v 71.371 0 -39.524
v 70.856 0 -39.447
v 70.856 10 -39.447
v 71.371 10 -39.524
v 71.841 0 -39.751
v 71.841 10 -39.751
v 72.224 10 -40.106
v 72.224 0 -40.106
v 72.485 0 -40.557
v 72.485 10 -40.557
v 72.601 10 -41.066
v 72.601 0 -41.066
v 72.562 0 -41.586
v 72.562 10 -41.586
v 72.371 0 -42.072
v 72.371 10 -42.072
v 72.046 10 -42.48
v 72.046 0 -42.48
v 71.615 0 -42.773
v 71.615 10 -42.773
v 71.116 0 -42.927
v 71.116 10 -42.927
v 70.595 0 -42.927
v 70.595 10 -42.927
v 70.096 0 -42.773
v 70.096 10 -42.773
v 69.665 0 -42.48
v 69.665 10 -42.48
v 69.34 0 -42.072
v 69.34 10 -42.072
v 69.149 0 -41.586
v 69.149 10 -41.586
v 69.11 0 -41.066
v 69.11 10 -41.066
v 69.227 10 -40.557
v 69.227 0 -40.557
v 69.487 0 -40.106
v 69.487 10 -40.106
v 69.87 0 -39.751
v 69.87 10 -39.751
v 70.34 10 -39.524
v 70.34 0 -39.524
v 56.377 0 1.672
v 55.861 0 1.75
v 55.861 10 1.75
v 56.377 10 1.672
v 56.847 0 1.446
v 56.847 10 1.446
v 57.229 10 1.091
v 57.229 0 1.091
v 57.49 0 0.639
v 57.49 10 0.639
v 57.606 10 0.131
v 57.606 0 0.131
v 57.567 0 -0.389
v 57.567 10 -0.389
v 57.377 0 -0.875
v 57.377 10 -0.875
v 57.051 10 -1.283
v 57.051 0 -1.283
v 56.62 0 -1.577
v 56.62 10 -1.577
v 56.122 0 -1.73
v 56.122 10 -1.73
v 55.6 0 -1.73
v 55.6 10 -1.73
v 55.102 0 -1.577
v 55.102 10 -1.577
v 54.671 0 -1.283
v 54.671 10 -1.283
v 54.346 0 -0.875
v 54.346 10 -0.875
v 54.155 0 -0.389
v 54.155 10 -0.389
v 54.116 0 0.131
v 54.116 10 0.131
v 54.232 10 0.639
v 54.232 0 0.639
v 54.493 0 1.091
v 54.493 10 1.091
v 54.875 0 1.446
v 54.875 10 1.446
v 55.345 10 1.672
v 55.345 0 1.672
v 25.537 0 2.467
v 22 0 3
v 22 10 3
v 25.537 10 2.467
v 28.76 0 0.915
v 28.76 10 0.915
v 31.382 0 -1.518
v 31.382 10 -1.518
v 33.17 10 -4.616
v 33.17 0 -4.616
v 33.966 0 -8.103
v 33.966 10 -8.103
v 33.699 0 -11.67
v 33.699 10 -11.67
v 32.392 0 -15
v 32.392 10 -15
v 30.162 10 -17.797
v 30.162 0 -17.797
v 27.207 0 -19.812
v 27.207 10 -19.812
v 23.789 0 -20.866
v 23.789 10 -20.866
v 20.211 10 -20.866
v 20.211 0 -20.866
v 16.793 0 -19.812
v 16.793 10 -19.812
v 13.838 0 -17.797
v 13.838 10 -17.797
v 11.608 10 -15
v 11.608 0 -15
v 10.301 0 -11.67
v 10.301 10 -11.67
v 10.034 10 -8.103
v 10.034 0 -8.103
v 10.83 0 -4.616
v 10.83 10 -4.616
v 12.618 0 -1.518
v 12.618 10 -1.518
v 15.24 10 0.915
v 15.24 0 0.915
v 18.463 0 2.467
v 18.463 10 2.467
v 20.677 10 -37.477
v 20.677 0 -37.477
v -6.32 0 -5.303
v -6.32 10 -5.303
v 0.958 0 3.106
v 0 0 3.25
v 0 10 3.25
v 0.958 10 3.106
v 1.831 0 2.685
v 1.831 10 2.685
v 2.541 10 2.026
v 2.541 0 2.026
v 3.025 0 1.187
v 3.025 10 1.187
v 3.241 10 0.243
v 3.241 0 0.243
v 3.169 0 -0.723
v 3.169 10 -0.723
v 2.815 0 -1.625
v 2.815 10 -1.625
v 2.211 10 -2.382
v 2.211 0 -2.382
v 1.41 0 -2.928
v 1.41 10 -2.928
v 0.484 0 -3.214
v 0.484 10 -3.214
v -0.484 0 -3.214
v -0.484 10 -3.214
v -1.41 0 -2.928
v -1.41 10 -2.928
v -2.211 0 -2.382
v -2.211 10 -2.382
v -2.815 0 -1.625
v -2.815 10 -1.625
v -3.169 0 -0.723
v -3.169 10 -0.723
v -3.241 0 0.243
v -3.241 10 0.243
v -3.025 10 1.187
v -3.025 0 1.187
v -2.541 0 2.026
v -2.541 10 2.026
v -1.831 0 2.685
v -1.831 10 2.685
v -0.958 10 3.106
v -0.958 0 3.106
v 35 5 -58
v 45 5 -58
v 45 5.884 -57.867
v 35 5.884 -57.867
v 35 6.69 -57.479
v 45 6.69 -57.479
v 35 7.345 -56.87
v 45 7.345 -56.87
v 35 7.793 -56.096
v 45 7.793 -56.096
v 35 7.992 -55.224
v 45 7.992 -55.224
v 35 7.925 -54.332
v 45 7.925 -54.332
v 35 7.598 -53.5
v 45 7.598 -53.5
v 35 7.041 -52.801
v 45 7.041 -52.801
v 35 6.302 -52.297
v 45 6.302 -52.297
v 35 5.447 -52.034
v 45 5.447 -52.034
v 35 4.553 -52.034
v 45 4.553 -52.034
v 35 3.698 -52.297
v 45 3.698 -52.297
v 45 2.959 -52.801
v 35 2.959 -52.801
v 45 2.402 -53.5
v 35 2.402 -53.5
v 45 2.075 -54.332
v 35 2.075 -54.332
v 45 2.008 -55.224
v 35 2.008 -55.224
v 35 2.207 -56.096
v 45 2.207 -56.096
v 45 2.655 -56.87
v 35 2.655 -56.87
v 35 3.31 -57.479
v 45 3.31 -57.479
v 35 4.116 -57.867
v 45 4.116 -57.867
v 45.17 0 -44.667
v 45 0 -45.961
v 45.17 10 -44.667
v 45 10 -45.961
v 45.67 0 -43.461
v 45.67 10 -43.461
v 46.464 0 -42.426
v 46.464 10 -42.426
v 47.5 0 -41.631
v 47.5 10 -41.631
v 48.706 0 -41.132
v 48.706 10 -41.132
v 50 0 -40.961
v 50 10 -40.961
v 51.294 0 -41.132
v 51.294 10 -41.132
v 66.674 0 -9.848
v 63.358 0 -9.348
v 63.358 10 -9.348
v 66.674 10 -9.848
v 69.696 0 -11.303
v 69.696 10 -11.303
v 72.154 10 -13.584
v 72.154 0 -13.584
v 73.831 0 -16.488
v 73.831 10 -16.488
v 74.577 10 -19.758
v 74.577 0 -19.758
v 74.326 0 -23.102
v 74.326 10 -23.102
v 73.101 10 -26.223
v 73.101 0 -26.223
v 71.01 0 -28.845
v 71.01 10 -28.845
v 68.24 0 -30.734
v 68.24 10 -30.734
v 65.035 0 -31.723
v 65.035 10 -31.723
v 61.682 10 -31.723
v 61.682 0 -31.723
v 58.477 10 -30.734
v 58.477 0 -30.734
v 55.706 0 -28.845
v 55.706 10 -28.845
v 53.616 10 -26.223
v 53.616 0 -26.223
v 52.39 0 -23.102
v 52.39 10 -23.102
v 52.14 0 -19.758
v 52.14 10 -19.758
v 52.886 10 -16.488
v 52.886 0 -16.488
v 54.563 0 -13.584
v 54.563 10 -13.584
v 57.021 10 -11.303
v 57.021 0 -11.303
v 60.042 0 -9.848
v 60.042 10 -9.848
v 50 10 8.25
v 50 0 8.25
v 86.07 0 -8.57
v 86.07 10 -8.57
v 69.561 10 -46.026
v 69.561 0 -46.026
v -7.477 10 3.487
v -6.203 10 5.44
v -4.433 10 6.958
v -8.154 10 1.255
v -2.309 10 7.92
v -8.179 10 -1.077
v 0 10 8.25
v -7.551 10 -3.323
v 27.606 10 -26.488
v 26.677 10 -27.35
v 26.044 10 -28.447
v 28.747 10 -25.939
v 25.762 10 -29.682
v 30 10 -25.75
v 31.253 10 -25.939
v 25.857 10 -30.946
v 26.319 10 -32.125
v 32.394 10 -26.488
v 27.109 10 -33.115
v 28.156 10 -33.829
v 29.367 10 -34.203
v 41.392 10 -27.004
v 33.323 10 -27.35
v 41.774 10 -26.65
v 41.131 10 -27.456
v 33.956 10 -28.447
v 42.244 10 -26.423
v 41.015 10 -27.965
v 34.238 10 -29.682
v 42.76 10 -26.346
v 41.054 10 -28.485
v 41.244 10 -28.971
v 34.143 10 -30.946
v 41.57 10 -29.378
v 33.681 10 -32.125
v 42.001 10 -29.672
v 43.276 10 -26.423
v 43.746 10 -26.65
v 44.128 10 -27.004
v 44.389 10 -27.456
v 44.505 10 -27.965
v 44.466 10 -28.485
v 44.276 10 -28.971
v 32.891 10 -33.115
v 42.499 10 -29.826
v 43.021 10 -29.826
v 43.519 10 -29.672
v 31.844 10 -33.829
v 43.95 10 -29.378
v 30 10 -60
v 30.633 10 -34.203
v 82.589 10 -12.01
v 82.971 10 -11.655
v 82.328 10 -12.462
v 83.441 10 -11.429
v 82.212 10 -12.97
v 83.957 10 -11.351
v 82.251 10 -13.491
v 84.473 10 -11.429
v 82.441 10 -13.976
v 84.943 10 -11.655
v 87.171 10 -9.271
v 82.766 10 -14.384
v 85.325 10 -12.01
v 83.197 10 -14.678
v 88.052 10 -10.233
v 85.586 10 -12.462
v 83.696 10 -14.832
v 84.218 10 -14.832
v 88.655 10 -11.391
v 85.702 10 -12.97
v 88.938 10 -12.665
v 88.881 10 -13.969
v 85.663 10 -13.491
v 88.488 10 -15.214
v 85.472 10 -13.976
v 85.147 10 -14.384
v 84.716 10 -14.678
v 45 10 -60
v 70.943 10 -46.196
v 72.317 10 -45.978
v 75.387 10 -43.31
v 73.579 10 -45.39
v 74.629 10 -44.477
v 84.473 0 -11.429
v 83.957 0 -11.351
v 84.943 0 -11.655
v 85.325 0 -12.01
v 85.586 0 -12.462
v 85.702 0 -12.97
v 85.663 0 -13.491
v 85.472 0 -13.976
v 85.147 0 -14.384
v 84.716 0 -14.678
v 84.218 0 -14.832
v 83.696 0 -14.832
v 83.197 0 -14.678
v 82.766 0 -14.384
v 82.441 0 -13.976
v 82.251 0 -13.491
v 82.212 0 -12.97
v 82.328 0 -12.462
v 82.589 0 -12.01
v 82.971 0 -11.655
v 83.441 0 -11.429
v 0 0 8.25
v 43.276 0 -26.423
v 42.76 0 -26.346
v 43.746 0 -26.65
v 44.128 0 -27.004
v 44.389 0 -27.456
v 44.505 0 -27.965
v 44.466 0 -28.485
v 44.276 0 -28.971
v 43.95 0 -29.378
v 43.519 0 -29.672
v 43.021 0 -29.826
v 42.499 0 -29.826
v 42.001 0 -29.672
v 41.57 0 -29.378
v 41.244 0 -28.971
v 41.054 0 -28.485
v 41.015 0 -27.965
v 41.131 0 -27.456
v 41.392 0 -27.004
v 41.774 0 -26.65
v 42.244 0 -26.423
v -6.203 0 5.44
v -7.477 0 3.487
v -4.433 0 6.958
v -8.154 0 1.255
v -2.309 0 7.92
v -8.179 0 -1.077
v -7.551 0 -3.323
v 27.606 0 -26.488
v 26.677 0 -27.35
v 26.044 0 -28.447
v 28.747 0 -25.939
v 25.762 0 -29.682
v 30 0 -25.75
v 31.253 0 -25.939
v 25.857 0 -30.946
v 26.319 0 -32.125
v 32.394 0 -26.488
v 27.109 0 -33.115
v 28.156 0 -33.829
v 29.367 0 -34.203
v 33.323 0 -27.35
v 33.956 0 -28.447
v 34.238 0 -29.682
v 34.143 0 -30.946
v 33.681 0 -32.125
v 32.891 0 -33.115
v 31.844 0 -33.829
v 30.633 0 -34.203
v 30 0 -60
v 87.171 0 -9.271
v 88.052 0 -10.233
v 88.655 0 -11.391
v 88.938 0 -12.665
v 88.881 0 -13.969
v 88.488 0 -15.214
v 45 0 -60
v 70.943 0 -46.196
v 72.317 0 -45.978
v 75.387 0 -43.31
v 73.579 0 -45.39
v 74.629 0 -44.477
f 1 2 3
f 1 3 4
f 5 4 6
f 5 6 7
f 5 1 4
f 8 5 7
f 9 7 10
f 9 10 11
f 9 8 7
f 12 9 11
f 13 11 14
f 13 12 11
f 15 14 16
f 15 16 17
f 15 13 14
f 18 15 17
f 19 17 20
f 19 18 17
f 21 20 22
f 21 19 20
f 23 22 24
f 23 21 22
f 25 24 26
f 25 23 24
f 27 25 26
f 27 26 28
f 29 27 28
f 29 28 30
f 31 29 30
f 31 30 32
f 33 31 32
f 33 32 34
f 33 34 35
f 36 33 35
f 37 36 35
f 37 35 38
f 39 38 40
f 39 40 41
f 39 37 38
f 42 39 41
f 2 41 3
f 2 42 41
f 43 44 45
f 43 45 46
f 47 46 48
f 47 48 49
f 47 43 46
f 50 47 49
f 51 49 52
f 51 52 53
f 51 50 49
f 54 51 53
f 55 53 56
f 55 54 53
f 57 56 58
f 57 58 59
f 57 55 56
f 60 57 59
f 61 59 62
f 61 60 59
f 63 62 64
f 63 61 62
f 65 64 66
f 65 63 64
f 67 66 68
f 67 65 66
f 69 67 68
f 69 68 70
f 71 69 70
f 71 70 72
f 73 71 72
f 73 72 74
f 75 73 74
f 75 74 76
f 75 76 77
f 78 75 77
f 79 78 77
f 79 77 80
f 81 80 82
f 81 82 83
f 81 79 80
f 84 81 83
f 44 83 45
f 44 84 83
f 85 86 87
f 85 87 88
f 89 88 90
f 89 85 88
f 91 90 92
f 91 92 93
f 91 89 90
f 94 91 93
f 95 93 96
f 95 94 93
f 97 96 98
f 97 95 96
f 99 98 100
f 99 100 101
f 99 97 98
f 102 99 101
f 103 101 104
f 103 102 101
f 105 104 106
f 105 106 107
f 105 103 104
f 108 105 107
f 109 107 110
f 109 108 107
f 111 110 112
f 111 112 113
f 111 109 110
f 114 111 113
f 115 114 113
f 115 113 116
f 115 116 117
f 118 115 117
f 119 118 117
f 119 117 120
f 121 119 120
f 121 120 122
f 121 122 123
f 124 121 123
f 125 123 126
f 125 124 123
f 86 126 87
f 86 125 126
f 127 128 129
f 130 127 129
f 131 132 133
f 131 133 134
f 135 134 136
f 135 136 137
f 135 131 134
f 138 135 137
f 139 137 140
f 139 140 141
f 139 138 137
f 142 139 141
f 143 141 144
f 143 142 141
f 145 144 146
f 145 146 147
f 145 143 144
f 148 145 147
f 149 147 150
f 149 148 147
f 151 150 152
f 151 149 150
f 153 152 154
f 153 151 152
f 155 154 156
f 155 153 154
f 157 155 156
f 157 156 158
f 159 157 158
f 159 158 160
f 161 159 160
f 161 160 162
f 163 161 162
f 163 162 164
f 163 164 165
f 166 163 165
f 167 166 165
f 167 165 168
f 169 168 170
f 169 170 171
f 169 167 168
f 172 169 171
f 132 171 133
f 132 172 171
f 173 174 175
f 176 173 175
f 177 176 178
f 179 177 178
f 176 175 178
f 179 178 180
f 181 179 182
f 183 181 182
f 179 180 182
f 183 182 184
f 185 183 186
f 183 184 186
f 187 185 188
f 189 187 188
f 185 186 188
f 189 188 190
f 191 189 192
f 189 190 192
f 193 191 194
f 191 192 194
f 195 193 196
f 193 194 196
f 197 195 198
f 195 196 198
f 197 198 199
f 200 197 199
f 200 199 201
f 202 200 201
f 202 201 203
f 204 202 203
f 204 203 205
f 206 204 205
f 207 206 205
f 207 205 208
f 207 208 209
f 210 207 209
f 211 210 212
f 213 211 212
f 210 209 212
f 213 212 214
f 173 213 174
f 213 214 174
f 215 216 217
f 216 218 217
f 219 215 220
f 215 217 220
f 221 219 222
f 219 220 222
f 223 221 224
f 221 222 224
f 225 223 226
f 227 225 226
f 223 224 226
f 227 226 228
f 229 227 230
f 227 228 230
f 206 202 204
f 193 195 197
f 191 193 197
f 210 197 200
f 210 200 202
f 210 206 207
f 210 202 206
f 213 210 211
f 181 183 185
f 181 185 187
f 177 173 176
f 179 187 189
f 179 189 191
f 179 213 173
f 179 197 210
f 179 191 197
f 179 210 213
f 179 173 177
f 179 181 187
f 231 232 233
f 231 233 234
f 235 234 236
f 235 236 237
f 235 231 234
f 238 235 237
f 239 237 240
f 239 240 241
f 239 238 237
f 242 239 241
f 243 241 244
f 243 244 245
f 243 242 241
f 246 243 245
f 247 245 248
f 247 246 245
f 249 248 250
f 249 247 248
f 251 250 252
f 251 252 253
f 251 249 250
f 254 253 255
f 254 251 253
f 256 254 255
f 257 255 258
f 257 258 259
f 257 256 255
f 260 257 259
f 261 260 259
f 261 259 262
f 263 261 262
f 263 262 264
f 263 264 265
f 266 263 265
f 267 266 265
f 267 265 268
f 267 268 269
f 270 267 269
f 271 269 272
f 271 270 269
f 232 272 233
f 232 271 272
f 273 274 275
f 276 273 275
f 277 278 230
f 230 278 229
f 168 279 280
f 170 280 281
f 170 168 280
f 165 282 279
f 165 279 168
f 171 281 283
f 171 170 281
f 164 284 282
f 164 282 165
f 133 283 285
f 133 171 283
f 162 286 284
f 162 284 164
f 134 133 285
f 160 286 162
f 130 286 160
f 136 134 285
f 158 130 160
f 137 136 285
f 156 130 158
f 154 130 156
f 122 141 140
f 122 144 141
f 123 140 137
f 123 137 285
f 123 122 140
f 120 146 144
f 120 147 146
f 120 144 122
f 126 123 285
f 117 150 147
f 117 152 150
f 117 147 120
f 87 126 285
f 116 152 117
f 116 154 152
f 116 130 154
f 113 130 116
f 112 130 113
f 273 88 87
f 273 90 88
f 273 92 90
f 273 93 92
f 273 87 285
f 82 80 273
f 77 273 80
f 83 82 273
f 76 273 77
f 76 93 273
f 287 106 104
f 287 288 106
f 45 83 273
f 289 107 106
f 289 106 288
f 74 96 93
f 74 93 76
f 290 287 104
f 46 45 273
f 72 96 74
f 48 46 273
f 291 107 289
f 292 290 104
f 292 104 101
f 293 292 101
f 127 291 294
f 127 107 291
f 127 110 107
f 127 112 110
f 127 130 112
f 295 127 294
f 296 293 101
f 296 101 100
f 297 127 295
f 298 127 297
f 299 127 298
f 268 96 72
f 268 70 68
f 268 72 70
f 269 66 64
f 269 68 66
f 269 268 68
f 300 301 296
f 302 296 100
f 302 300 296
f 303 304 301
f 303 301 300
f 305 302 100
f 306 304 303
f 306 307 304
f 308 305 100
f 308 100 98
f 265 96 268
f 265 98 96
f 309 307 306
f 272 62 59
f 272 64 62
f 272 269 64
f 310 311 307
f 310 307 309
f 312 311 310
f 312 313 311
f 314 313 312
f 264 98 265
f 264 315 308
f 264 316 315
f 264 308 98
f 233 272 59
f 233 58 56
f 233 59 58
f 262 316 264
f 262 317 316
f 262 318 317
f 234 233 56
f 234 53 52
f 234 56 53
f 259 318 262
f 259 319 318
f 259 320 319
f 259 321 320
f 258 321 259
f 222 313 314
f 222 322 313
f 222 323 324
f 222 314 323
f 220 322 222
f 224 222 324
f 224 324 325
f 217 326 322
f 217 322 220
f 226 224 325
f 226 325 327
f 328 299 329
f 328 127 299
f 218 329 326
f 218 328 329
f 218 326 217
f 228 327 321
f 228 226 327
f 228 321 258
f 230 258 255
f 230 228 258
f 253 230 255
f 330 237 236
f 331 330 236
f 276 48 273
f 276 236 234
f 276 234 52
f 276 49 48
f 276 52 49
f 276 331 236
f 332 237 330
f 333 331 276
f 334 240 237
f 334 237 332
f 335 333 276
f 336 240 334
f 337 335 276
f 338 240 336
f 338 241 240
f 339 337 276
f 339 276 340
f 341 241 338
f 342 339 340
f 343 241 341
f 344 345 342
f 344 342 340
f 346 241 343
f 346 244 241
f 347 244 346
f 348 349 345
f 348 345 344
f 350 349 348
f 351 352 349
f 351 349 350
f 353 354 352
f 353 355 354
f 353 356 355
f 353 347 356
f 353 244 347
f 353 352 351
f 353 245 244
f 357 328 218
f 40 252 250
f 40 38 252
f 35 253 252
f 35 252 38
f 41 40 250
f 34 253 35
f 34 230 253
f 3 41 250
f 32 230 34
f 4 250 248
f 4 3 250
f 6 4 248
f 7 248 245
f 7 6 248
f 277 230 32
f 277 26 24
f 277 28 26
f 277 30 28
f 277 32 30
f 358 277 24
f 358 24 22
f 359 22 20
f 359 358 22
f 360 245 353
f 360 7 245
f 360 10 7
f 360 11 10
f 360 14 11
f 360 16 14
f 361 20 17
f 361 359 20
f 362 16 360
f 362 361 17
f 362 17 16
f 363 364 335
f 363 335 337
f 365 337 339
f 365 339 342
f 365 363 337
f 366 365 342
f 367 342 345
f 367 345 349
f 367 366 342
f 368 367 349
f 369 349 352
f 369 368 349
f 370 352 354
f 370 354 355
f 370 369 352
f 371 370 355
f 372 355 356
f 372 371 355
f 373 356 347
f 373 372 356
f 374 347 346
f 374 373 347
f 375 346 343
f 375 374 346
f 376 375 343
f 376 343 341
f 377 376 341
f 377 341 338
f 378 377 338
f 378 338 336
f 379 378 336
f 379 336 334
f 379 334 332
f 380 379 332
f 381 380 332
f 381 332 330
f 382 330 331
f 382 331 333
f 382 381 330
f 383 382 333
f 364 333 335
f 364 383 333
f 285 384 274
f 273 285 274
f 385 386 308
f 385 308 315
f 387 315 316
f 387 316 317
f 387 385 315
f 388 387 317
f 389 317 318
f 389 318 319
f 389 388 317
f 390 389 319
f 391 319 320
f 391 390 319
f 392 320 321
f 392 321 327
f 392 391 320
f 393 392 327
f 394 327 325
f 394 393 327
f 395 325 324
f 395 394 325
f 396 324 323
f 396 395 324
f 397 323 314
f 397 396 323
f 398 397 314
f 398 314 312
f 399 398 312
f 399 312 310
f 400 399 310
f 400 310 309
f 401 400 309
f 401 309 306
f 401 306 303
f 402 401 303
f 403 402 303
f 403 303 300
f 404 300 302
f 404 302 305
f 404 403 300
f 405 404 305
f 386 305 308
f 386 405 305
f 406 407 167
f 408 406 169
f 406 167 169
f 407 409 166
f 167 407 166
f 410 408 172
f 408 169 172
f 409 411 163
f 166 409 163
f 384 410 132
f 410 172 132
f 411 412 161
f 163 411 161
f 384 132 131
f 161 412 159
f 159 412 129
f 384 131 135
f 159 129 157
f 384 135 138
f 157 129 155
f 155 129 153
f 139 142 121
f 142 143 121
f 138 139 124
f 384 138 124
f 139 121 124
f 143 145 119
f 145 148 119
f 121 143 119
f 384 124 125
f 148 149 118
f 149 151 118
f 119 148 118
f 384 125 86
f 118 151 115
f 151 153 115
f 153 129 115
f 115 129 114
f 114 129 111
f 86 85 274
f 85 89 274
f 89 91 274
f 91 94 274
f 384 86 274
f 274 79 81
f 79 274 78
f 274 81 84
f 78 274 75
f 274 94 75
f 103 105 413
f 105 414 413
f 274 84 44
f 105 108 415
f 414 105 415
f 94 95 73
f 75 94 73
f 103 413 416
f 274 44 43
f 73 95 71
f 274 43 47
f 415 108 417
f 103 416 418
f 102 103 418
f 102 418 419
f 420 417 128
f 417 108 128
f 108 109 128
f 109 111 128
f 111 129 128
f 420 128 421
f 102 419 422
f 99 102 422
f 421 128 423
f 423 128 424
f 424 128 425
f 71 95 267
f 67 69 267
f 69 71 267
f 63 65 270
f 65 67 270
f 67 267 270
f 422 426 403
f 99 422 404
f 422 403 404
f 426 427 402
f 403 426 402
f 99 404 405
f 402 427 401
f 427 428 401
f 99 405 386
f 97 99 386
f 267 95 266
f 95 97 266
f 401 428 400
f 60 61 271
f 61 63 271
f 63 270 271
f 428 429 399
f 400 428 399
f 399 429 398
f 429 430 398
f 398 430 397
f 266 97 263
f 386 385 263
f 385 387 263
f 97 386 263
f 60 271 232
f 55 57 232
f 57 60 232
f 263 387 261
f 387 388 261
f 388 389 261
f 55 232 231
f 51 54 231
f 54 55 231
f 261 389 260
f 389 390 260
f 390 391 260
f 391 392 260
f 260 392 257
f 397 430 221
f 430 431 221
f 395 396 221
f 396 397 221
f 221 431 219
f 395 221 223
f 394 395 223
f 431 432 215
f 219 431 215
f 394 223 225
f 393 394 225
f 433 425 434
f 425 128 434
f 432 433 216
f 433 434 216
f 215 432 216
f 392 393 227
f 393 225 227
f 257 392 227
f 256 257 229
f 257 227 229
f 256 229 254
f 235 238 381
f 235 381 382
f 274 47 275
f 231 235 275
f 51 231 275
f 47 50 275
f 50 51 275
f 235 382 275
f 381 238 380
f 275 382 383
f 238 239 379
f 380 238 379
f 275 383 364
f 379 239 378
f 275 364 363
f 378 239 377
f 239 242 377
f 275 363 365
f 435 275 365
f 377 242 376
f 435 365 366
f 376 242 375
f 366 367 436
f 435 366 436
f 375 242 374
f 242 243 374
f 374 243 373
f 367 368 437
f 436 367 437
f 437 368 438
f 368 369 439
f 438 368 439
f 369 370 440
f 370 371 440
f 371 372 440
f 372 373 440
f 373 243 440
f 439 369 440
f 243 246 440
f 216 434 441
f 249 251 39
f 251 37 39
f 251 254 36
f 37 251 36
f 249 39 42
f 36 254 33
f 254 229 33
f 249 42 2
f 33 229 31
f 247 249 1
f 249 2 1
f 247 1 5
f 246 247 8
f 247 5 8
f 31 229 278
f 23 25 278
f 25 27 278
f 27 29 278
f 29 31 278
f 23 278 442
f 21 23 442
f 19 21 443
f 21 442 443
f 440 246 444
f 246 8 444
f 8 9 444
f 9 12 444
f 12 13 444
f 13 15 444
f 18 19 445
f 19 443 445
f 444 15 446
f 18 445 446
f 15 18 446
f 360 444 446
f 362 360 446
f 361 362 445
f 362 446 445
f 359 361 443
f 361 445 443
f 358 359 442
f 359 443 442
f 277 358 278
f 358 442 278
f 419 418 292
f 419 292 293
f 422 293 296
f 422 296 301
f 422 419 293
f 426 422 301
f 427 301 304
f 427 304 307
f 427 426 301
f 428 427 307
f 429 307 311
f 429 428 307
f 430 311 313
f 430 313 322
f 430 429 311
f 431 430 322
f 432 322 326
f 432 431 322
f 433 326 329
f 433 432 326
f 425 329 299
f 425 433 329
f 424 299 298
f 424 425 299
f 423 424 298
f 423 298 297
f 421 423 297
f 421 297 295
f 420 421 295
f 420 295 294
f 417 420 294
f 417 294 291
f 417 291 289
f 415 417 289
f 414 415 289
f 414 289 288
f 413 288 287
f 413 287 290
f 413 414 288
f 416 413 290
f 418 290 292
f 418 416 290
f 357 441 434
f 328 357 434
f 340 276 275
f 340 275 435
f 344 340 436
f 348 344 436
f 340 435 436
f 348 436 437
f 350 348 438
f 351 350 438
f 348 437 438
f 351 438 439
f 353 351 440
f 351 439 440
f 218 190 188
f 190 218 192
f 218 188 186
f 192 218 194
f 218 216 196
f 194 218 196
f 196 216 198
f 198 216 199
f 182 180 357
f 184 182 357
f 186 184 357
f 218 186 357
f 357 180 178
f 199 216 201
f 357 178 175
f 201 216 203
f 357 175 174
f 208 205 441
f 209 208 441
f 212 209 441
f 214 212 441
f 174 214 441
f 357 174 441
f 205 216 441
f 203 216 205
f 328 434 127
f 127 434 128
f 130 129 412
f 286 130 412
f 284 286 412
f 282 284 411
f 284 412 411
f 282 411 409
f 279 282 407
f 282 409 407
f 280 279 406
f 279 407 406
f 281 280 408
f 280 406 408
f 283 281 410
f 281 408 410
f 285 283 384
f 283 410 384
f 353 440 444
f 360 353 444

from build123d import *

# Parameters (mm, degrees)
SKETCH1_R           = 3.25
SKETCH1_R_2         = 4.25
SKETCH1_R_3         = 11.25
SKETCH1_R_4         = 1.75
SKETCH1_R_5         = 12
BOSS_EXTRUDE1_DEPTH = 10
FILLET1_R           = 5
SKETCH2_R           = 3
CUT_EXTRUDE1_DEPTH  = 10


with BuildPart() as part:
    # Sketch1 → Boss-Extrude1 (new body)
    with BuildSketch(Plane(origin=(0, 0, 0), x_dir=(1, 0, 0), z_dir=(0, 1, 0))):
        with BuildLine():
            Line((0, -8.25), (50, -8.25))
            Line((50, -8.25), (86.069806885, 8.569627179))
            ThreePointArc((86.069806885, 8.569627179), (88.655178681, 11.391065397), (88.488254512, 15.214257423))
            Line((88.488254512, 15.214257423), (75.387088398, 43.309798821))
            ThreePointArc((75.387088398, 43.309798821), (72.968640771, 45.728246447), (69.561454237, 46.026336644))
            Line((69.561454237, 46.026336644), (45, 39.445114816))
            Line((45, 39.445114816), (45, 60))
            Line((45, 60), (30, 60))
            Line((30, 60), (20.677212951, 37.476864391))
            Line((20.677212951, 37.476864391), (-6.319866656, 5.30299778))
            ThreePointArc((-6.319866656, 5.30299778), (-7.477039243, -3.486600659), (0, -8.25))
        make_face()
        with Locations(Location((0, 0, 0), (0, 0, 270))):
            Circle(SKETCH1_R, mode=Mode.SUBTRACT)
        with Locations(Location((30, 30, 0), (0, 0, 270))):
            Circle(SKETCH1_R_2, mode=Mode.SUBTRACT)
        with Locations(Location((63.358361821, 20.598353756, 0), (0, 0, 270))):
            Circle(SKETCH1_R_3, mode=Mode.SUBTRACT)
        with Locations(Location((42.760008064, 28.095541398, 0), (0, 0, 270))):
            Circle(SKETCH1_R_4, mode=Mode.SUBTRACT)
        with Locations(Location((70.855549463, 41.196707512, 0), (0, 0, 270))):
            Circle(SKETCH1_R_4, mode=Mode.SUBTRACT)
        with Locations(Location((83.956715577, 13.101166114, 0), (0, 0, 270))):
            Circle(SKETCH1_R_4, mode=Mode.SUBTRACT)
        with Locations(Location((55.861174178, 0, 0), (0, 0, 270))):
            Circle(SKETCH1_R_4, mode=Mode.SUBTRACT)
        with Locations(Location((22, 9, 0), (0, 0, 270))):
            Circle(SKETCH1_R_5, mode=Mode.SUBTRACT)
    extrude(amount=BOSS_EXTRUDE1_DEPTH)

    # Fillet1
    fillet1_edges = [part.edges().sort_by_distance(p)[0] for p in [
        (45, 5, -39.445114816),
    ]]
    fillet(fillet1_edges, radius=FILLET1_R)

    # Sketch2 → Cut-Extrude1 (cut)
    with BuildSketch(Plane(origin=(45, 0, 0), x_dir=(0, 0, -1), z_dir=(1, 0, 0))):
        with Locations((55, 5)):
            Circle(SKETCH2_R)
    extrude(amount=-CUT_EXTRUDE1_DEPTH, mode=Mode.SUBTRACT)


solid = part.part
